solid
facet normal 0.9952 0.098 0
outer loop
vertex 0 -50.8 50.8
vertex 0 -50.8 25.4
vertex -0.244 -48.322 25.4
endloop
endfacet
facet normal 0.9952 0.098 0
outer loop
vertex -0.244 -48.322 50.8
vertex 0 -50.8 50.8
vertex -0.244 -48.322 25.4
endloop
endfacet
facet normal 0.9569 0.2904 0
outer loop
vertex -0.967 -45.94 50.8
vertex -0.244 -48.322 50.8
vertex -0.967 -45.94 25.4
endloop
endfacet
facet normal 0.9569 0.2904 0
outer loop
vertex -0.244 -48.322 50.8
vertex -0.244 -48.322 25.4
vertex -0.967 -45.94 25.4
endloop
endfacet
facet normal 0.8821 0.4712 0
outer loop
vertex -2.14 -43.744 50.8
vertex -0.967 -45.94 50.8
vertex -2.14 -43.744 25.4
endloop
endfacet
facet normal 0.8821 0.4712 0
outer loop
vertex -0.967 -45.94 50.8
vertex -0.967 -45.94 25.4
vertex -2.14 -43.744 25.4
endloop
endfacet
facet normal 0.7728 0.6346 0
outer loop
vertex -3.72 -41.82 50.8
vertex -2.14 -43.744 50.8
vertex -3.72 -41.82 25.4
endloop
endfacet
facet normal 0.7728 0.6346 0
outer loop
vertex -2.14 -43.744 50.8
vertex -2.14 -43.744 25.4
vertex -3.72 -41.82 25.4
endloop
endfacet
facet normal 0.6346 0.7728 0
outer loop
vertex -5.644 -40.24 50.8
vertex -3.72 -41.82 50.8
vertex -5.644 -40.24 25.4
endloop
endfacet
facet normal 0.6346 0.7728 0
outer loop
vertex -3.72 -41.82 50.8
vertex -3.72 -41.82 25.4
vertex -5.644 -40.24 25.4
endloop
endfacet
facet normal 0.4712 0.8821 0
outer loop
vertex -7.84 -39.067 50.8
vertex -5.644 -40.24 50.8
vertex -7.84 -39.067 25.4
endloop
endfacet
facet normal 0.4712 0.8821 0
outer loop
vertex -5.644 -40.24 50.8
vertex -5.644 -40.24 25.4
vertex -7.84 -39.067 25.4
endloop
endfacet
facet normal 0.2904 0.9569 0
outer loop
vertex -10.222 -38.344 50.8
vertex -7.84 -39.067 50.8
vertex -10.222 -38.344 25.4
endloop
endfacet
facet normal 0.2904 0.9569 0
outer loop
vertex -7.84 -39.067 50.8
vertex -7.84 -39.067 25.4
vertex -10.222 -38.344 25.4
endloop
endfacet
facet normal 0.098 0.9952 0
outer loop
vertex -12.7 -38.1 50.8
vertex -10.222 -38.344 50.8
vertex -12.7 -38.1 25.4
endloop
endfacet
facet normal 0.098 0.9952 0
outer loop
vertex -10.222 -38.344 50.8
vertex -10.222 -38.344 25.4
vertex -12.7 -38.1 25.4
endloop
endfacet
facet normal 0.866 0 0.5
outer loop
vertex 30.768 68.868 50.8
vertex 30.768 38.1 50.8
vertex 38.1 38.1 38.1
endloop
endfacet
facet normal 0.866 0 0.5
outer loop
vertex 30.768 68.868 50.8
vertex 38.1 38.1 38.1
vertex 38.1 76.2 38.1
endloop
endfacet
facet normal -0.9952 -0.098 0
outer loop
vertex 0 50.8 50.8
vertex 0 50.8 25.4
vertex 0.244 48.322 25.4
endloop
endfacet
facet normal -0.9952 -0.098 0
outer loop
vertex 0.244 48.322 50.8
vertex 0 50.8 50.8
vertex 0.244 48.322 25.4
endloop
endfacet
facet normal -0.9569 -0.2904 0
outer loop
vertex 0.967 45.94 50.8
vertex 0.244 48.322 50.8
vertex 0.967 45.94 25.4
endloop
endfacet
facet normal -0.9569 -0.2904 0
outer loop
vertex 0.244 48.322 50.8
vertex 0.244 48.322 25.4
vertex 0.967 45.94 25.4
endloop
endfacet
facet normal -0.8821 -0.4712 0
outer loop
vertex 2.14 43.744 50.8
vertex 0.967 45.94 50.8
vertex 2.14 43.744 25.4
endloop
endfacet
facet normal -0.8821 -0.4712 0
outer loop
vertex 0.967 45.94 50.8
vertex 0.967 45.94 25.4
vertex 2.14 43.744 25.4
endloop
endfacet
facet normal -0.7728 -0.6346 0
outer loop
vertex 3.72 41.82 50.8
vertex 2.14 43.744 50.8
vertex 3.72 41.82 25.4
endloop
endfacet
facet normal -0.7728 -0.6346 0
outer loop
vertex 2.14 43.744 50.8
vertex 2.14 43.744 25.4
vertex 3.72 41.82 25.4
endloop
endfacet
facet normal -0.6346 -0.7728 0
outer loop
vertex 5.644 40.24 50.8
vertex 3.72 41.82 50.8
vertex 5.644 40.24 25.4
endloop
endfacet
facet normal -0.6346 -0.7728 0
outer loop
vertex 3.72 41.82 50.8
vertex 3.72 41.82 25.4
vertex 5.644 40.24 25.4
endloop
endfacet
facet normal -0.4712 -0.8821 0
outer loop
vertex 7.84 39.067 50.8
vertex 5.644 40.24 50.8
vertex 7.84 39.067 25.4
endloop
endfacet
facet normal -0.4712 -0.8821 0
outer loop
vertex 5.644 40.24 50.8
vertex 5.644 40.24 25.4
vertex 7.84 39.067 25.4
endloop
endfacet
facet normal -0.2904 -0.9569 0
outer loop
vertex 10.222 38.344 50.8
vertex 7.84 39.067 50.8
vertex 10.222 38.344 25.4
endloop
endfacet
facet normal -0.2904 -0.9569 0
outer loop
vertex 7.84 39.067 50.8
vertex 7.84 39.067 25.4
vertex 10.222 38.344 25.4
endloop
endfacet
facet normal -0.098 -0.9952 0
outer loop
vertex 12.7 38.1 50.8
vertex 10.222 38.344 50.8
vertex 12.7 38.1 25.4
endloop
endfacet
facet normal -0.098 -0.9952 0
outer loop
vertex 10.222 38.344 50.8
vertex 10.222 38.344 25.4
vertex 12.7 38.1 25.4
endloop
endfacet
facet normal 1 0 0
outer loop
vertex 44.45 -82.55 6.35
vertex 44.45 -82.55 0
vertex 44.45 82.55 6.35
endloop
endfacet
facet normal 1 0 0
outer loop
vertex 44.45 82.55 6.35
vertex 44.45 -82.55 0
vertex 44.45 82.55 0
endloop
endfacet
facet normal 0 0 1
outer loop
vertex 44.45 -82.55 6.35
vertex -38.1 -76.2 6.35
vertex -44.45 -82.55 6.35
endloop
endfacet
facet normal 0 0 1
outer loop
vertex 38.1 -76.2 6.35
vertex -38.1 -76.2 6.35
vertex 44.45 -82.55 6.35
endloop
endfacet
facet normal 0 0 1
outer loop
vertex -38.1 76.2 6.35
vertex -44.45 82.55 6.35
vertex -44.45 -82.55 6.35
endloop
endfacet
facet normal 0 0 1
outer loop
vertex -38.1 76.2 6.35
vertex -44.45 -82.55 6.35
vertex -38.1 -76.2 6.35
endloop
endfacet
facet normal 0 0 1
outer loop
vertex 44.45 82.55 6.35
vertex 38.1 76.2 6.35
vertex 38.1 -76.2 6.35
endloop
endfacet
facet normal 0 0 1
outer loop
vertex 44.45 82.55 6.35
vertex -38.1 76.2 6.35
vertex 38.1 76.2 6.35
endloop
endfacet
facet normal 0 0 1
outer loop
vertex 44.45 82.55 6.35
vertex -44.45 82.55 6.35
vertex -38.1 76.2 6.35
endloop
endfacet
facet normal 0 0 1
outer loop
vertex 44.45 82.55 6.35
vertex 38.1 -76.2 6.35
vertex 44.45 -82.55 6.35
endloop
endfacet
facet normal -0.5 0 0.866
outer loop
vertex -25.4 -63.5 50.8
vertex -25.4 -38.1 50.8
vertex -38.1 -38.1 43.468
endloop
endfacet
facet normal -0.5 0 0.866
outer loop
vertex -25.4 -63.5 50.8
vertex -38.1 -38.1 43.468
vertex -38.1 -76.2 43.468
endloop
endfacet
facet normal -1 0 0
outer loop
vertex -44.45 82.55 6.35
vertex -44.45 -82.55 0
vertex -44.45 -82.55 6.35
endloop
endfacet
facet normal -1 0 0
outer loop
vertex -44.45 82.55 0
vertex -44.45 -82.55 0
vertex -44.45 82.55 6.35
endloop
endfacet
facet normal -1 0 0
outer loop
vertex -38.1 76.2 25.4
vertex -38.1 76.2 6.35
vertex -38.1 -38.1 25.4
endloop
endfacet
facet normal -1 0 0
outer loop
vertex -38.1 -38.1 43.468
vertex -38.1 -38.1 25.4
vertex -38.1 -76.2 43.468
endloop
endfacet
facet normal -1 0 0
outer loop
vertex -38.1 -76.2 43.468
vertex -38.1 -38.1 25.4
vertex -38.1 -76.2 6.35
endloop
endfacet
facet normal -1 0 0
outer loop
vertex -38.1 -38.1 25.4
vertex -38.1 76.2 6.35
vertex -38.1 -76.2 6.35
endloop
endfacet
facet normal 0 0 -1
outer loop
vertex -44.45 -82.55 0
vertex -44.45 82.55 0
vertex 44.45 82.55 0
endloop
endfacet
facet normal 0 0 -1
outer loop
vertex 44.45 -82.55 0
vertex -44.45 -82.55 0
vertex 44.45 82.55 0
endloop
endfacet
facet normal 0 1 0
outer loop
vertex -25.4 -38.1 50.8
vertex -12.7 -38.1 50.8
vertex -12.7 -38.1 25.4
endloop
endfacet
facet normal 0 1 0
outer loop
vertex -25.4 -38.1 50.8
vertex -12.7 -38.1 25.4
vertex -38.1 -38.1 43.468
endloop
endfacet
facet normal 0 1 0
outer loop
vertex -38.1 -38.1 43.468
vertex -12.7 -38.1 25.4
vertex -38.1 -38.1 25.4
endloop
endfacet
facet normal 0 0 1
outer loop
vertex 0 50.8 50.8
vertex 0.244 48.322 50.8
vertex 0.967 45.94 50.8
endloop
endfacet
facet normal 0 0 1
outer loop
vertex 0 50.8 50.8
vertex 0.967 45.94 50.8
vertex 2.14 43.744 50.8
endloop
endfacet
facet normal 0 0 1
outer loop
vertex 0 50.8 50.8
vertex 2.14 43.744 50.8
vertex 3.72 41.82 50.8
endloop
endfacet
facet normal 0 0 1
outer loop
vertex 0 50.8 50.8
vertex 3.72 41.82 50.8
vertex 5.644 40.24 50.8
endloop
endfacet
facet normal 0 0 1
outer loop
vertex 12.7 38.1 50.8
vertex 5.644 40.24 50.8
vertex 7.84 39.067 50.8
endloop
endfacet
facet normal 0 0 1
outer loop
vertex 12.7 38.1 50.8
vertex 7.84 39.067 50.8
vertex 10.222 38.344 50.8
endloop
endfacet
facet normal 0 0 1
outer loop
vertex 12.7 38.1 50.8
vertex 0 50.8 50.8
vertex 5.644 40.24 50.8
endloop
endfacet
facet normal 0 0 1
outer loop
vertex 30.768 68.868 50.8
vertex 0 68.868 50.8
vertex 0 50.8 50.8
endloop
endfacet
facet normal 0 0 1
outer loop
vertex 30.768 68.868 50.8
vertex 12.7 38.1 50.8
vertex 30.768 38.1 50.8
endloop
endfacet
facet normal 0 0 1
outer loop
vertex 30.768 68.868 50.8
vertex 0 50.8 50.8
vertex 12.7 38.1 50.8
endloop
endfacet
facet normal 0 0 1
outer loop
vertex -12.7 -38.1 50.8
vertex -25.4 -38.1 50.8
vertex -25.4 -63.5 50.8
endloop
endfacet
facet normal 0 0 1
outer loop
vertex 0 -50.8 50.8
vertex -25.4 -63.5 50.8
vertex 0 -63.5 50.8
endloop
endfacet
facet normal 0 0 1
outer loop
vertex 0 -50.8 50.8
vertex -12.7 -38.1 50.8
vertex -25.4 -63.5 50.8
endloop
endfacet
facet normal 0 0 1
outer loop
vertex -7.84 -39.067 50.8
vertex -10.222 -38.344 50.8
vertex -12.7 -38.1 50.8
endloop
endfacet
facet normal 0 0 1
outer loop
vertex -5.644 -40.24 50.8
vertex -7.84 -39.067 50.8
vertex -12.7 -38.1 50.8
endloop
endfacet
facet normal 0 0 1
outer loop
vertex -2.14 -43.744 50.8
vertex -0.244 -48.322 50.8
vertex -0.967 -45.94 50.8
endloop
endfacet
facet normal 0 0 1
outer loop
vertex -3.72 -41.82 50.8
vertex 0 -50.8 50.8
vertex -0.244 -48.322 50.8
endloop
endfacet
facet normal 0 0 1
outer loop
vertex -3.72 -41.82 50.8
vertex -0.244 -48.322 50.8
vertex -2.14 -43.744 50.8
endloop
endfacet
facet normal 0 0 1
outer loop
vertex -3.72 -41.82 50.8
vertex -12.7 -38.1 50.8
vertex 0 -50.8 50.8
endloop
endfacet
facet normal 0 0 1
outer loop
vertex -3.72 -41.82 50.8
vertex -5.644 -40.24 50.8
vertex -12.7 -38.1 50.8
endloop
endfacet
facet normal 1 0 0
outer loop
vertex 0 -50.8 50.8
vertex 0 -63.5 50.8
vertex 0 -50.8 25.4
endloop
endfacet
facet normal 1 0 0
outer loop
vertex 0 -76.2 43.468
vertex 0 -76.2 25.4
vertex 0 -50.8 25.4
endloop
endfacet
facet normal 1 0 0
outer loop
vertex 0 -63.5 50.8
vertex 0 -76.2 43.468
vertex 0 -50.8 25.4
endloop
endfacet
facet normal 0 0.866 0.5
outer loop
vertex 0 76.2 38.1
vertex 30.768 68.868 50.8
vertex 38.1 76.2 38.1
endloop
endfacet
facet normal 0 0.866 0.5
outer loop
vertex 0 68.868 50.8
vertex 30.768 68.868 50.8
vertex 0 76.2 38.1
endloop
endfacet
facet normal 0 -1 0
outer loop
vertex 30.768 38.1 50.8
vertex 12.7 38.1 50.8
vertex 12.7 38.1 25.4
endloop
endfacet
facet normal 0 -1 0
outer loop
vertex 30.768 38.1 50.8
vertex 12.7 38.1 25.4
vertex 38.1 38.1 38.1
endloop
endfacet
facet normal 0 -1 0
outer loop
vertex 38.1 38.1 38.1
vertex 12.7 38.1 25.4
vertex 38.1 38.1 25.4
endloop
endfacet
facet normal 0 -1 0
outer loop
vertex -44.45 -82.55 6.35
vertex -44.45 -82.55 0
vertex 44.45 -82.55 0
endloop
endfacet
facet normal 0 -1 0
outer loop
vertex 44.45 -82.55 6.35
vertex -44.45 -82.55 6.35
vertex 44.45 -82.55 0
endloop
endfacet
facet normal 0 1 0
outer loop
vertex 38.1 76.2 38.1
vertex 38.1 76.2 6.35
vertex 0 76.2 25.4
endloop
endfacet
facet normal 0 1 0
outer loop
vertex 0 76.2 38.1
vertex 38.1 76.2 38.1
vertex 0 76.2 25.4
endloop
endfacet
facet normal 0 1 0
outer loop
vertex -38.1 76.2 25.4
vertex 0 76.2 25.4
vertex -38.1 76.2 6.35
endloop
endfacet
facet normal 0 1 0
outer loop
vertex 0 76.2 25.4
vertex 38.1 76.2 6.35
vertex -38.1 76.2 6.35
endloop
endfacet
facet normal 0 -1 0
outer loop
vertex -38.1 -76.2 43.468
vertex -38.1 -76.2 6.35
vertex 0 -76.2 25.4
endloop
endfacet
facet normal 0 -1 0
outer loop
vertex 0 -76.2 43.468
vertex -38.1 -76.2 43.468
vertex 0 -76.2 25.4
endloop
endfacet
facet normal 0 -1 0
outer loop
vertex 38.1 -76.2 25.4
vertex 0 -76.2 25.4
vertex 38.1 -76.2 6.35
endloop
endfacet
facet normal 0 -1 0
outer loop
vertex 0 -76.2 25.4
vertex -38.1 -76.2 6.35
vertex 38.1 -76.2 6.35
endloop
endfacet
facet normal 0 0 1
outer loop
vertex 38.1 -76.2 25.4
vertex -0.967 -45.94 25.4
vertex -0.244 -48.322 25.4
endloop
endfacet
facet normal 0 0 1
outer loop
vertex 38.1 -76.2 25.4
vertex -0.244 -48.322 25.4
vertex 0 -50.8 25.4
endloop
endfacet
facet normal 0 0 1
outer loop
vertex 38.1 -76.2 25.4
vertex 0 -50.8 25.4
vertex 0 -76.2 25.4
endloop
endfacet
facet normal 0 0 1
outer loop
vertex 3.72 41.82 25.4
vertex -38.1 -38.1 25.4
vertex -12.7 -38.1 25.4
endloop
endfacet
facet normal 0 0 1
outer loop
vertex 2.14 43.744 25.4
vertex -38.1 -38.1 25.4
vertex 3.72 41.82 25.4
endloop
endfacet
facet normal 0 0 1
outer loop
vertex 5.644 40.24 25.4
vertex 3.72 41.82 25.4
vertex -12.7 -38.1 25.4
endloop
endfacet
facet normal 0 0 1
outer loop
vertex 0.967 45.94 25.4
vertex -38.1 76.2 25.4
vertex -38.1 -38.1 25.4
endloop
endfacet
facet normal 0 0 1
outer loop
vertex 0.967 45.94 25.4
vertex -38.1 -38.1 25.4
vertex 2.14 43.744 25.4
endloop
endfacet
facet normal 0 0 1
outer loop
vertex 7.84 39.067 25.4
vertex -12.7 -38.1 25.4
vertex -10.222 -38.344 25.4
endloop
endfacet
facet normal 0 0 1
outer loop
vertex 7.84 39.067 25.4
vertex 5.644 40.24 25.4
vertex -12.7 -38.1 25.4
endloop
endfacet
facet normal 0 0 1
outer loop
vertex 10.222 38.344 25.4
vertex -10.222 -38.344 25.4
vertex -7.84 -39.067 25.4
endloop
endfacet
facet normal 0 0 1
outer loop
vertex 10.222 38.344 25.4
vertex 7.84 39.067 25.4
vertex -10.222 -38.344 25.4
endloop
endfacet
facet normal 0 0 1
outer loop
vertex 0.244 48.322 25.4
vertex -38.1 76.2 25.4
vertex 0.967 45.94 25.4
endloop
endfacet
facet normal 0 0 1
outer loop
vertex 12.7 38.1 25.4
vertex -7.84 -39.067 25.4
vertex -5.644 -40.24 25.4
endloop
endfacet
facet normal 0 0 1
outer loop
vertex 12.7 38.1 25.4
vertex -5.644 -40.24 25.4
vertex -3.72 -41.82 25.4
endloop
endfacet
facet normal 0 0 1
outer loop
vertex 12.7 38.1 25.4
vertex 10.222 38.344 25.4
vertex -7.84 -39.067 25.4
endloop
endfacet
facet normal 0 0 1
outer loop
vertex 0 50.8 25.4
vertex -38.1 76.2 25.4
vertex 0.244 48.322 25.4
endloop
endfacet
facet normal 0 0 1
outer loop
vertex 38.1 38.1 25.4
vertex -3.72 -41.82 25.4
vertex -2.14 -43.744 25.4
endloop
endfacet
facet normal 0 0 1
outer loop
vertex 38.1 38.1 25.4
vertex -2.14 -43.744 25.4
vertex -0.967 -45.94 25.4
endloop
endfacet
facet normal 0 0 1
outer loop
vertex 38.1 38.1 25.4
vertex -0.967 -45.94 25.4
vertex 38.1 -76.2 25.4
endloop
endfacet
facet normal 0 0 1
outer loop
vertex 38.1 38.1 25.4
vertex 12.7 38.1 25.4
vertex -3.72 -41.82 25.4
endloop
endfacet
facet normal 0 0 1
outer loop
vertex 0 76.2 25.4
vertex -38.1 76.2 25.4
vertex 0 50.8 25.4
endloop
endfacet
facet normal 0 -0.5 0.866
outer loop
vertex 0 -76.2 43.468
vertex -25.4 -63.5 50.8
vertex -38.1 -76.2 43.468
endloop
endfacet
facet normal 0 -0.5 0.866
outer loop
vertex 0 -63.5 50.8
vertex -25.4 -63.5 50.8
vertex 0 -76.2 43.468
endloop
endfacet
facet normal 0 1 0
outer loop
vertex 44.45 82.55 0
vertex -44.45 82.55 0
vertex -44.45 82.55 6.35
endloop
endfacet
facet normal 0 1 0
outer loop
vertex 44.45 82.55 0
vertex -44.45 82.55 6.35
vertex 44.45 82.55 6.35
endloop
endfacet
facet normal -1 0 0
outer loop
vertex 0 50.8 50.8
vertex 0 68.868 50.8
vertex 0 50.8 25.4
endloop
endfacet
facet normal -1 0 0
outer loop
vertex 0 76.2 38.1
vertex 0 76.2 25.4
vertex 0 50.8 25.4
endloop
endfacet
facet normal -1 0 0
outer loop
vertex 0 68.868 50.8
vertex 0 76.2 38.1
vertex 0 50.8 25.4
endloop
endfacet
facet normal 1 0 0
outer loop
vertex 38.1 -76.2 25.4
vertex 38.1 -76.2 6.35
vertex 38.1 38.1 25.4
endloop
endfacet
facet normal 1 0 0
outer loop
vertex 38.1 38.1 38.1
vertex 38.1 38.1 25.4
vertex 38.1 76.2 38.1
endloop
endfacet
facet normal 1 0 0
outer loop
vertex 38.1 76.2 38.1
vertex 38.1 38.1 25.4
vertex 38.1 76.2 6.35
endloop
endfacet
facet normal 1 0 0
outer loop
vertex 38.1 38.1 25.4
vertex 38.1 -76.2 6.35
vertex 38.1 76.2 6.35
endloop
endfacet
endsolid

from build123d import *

# Parameters (mm, degrees)
F0_W        = 88.9
F0_H        = 165.1
F1_DEPTH    = 6.35
F2_DEPTH    = 25.4
F3_DEPTH    = 50.8
F4_C1_SIZE2 = 7.3323484187
F4_C1_SIZE  = 12.7
F4_C2_SIZE2 = 12.7
F4_C2_SIZE  = 7.3323484187
F4_C3_SIZE2 = 12.7
F4_C3_SIZE  = 7.3323484187
F4_C4_SIZE2 = 7.3323484187
F4_C4_SIZE  = 12.7


with BuildPart() as f1:
    # F0 (on Top) → F1 (new body)
    with BuildSketch(Plane.XY):
        Rectangle(F0_W, F0_H)
        Polygon((38.1, 38.1), (38.1, -76.2), (0, -76.2), (-38.1, -76.2), (-38.1, -38.1), (-38.1, 76.2), (0, 76.2), (38.1, 76.2), align=None, mode=Mode.SUBTRACT)
    extrude(amount=F1_DEPTH)

    # F0 (on Top) → F2 (join)
    with BuildSketch(Plane.XY):
        with BuildLine():
            Line((0, -76.2), (38.1, -76.2))
            Line((38.1, -76.2), (38.1, 38.1))
            Line((38.1, 38.1), (12.7, 38.1))
            ThreePointArc((12.7, 38.1), (3.7197438789, 41.8197438789), (0, 50.8))
            Line((0, 50.8), (0, 76.2))
            Line((0, 76.2), (-38.1, 76.2))
            Line((-38.1, 76.2), (-38.1, -38.1))
            Line((-38.1, -38.1), (-12.7, -38.1))
            ThreePointArc((-12.7, -38.1), (-3.7197438789, -41.8197438789), (0, -50.8))
            Line((0, -50.8), (0, -76.2))
        make_face()
    extrude(amount=F2_DEPTH)

    # F0 (on Top) → F3 (join)
    with BuildSketch(Plane.XY):
        with BuildLine():
            Line((-38.1, -76.2), (0, -76.2))
            Line((0, -76.2), (0, -50.8))
            ThreePointArc((0, -50.8), (-3.7197438789, -41.8197438789), (-12.7, -38.1))
            Line((-12.7, -38.1), (-38.1, -38.1))
            Line((-38.1, -38.1), (-38.1, -76.2))
        make_face()
        with BuildLine():
            Line((12.7, 38.1), (38.1, 38.1))
            Line((38.1, 38.1), (38.1, 76.2))
            Line((38.1, 76.2), (0, 76.2))
            Line((0, 76.2), (0, 50.8))
            ThreePointArc((0, 50.8), (3.7197438789, 41.8197438789), (12.7, 38.1))
        make_face()
    extrude(amount=F3_DEPTH)

    # F4: chamfer of 12.7 x 7.3323484187 on 4 edges, made by hand

    # F4_c1
    f4_c1_edges = [f1.edges().sort_by_distance(p)[0] for p in [
        (19.05, 76.2, 50.8),
    ]]
    f4_c1_side = f1.faces().sort_by_distance((19.05, 76.2, 50.6533530316))[0]
    chamfer(f4_c1_edges, length=F4_C1_SIZE, length2=F4_C1_SIZE2, reference=f4_c1_side)

    # F4_c2
    f4_c2_edges = [f1.edges().sort_by_distance(p)[0] for p in [
        (-19.05, -76.2, 50.8),
    ]]
    f4_c2_side = f1.faces().sort_by_distance((-19.05, -76.2, 50.6533530316))[0]
    chamfer(f4_c2_edges, length=F4_C2_SIZE, length2=F4_C2_SIZE2, reference=f4_c2_side)

    # F4_c3
    f4_c3_edges = [f1.edges().sort_by_distance(p)[0] for p in [
        (-38.1, -50.8, 50.8),
    ]]
    f4_c3_side = f1.faces().sort_by_distance((-38.1, -50.8, 50.6533530316))[0]
    chamfer(f4_c3_edges, length=F4_C3_SIZE, length2=F4_C3_SIZE2, reference=f4_c3_side)

    # F4_c4
    f4_c4_edges = [f1.edges().sort_by_distance(p)[0] for p in [
        (38.1, 53.4838257906, 50.8),
    ]]
    f4_c4_side = f1.faces().sort_by_distance((38.1, 53.4838257906, 50.6533530316))[0]
    chamfer(f4_c4_edges, length=F4_C4_SIZE, length2=F4_C4_SIZE2, reference=f4_c4_side)


solid = f1.part
